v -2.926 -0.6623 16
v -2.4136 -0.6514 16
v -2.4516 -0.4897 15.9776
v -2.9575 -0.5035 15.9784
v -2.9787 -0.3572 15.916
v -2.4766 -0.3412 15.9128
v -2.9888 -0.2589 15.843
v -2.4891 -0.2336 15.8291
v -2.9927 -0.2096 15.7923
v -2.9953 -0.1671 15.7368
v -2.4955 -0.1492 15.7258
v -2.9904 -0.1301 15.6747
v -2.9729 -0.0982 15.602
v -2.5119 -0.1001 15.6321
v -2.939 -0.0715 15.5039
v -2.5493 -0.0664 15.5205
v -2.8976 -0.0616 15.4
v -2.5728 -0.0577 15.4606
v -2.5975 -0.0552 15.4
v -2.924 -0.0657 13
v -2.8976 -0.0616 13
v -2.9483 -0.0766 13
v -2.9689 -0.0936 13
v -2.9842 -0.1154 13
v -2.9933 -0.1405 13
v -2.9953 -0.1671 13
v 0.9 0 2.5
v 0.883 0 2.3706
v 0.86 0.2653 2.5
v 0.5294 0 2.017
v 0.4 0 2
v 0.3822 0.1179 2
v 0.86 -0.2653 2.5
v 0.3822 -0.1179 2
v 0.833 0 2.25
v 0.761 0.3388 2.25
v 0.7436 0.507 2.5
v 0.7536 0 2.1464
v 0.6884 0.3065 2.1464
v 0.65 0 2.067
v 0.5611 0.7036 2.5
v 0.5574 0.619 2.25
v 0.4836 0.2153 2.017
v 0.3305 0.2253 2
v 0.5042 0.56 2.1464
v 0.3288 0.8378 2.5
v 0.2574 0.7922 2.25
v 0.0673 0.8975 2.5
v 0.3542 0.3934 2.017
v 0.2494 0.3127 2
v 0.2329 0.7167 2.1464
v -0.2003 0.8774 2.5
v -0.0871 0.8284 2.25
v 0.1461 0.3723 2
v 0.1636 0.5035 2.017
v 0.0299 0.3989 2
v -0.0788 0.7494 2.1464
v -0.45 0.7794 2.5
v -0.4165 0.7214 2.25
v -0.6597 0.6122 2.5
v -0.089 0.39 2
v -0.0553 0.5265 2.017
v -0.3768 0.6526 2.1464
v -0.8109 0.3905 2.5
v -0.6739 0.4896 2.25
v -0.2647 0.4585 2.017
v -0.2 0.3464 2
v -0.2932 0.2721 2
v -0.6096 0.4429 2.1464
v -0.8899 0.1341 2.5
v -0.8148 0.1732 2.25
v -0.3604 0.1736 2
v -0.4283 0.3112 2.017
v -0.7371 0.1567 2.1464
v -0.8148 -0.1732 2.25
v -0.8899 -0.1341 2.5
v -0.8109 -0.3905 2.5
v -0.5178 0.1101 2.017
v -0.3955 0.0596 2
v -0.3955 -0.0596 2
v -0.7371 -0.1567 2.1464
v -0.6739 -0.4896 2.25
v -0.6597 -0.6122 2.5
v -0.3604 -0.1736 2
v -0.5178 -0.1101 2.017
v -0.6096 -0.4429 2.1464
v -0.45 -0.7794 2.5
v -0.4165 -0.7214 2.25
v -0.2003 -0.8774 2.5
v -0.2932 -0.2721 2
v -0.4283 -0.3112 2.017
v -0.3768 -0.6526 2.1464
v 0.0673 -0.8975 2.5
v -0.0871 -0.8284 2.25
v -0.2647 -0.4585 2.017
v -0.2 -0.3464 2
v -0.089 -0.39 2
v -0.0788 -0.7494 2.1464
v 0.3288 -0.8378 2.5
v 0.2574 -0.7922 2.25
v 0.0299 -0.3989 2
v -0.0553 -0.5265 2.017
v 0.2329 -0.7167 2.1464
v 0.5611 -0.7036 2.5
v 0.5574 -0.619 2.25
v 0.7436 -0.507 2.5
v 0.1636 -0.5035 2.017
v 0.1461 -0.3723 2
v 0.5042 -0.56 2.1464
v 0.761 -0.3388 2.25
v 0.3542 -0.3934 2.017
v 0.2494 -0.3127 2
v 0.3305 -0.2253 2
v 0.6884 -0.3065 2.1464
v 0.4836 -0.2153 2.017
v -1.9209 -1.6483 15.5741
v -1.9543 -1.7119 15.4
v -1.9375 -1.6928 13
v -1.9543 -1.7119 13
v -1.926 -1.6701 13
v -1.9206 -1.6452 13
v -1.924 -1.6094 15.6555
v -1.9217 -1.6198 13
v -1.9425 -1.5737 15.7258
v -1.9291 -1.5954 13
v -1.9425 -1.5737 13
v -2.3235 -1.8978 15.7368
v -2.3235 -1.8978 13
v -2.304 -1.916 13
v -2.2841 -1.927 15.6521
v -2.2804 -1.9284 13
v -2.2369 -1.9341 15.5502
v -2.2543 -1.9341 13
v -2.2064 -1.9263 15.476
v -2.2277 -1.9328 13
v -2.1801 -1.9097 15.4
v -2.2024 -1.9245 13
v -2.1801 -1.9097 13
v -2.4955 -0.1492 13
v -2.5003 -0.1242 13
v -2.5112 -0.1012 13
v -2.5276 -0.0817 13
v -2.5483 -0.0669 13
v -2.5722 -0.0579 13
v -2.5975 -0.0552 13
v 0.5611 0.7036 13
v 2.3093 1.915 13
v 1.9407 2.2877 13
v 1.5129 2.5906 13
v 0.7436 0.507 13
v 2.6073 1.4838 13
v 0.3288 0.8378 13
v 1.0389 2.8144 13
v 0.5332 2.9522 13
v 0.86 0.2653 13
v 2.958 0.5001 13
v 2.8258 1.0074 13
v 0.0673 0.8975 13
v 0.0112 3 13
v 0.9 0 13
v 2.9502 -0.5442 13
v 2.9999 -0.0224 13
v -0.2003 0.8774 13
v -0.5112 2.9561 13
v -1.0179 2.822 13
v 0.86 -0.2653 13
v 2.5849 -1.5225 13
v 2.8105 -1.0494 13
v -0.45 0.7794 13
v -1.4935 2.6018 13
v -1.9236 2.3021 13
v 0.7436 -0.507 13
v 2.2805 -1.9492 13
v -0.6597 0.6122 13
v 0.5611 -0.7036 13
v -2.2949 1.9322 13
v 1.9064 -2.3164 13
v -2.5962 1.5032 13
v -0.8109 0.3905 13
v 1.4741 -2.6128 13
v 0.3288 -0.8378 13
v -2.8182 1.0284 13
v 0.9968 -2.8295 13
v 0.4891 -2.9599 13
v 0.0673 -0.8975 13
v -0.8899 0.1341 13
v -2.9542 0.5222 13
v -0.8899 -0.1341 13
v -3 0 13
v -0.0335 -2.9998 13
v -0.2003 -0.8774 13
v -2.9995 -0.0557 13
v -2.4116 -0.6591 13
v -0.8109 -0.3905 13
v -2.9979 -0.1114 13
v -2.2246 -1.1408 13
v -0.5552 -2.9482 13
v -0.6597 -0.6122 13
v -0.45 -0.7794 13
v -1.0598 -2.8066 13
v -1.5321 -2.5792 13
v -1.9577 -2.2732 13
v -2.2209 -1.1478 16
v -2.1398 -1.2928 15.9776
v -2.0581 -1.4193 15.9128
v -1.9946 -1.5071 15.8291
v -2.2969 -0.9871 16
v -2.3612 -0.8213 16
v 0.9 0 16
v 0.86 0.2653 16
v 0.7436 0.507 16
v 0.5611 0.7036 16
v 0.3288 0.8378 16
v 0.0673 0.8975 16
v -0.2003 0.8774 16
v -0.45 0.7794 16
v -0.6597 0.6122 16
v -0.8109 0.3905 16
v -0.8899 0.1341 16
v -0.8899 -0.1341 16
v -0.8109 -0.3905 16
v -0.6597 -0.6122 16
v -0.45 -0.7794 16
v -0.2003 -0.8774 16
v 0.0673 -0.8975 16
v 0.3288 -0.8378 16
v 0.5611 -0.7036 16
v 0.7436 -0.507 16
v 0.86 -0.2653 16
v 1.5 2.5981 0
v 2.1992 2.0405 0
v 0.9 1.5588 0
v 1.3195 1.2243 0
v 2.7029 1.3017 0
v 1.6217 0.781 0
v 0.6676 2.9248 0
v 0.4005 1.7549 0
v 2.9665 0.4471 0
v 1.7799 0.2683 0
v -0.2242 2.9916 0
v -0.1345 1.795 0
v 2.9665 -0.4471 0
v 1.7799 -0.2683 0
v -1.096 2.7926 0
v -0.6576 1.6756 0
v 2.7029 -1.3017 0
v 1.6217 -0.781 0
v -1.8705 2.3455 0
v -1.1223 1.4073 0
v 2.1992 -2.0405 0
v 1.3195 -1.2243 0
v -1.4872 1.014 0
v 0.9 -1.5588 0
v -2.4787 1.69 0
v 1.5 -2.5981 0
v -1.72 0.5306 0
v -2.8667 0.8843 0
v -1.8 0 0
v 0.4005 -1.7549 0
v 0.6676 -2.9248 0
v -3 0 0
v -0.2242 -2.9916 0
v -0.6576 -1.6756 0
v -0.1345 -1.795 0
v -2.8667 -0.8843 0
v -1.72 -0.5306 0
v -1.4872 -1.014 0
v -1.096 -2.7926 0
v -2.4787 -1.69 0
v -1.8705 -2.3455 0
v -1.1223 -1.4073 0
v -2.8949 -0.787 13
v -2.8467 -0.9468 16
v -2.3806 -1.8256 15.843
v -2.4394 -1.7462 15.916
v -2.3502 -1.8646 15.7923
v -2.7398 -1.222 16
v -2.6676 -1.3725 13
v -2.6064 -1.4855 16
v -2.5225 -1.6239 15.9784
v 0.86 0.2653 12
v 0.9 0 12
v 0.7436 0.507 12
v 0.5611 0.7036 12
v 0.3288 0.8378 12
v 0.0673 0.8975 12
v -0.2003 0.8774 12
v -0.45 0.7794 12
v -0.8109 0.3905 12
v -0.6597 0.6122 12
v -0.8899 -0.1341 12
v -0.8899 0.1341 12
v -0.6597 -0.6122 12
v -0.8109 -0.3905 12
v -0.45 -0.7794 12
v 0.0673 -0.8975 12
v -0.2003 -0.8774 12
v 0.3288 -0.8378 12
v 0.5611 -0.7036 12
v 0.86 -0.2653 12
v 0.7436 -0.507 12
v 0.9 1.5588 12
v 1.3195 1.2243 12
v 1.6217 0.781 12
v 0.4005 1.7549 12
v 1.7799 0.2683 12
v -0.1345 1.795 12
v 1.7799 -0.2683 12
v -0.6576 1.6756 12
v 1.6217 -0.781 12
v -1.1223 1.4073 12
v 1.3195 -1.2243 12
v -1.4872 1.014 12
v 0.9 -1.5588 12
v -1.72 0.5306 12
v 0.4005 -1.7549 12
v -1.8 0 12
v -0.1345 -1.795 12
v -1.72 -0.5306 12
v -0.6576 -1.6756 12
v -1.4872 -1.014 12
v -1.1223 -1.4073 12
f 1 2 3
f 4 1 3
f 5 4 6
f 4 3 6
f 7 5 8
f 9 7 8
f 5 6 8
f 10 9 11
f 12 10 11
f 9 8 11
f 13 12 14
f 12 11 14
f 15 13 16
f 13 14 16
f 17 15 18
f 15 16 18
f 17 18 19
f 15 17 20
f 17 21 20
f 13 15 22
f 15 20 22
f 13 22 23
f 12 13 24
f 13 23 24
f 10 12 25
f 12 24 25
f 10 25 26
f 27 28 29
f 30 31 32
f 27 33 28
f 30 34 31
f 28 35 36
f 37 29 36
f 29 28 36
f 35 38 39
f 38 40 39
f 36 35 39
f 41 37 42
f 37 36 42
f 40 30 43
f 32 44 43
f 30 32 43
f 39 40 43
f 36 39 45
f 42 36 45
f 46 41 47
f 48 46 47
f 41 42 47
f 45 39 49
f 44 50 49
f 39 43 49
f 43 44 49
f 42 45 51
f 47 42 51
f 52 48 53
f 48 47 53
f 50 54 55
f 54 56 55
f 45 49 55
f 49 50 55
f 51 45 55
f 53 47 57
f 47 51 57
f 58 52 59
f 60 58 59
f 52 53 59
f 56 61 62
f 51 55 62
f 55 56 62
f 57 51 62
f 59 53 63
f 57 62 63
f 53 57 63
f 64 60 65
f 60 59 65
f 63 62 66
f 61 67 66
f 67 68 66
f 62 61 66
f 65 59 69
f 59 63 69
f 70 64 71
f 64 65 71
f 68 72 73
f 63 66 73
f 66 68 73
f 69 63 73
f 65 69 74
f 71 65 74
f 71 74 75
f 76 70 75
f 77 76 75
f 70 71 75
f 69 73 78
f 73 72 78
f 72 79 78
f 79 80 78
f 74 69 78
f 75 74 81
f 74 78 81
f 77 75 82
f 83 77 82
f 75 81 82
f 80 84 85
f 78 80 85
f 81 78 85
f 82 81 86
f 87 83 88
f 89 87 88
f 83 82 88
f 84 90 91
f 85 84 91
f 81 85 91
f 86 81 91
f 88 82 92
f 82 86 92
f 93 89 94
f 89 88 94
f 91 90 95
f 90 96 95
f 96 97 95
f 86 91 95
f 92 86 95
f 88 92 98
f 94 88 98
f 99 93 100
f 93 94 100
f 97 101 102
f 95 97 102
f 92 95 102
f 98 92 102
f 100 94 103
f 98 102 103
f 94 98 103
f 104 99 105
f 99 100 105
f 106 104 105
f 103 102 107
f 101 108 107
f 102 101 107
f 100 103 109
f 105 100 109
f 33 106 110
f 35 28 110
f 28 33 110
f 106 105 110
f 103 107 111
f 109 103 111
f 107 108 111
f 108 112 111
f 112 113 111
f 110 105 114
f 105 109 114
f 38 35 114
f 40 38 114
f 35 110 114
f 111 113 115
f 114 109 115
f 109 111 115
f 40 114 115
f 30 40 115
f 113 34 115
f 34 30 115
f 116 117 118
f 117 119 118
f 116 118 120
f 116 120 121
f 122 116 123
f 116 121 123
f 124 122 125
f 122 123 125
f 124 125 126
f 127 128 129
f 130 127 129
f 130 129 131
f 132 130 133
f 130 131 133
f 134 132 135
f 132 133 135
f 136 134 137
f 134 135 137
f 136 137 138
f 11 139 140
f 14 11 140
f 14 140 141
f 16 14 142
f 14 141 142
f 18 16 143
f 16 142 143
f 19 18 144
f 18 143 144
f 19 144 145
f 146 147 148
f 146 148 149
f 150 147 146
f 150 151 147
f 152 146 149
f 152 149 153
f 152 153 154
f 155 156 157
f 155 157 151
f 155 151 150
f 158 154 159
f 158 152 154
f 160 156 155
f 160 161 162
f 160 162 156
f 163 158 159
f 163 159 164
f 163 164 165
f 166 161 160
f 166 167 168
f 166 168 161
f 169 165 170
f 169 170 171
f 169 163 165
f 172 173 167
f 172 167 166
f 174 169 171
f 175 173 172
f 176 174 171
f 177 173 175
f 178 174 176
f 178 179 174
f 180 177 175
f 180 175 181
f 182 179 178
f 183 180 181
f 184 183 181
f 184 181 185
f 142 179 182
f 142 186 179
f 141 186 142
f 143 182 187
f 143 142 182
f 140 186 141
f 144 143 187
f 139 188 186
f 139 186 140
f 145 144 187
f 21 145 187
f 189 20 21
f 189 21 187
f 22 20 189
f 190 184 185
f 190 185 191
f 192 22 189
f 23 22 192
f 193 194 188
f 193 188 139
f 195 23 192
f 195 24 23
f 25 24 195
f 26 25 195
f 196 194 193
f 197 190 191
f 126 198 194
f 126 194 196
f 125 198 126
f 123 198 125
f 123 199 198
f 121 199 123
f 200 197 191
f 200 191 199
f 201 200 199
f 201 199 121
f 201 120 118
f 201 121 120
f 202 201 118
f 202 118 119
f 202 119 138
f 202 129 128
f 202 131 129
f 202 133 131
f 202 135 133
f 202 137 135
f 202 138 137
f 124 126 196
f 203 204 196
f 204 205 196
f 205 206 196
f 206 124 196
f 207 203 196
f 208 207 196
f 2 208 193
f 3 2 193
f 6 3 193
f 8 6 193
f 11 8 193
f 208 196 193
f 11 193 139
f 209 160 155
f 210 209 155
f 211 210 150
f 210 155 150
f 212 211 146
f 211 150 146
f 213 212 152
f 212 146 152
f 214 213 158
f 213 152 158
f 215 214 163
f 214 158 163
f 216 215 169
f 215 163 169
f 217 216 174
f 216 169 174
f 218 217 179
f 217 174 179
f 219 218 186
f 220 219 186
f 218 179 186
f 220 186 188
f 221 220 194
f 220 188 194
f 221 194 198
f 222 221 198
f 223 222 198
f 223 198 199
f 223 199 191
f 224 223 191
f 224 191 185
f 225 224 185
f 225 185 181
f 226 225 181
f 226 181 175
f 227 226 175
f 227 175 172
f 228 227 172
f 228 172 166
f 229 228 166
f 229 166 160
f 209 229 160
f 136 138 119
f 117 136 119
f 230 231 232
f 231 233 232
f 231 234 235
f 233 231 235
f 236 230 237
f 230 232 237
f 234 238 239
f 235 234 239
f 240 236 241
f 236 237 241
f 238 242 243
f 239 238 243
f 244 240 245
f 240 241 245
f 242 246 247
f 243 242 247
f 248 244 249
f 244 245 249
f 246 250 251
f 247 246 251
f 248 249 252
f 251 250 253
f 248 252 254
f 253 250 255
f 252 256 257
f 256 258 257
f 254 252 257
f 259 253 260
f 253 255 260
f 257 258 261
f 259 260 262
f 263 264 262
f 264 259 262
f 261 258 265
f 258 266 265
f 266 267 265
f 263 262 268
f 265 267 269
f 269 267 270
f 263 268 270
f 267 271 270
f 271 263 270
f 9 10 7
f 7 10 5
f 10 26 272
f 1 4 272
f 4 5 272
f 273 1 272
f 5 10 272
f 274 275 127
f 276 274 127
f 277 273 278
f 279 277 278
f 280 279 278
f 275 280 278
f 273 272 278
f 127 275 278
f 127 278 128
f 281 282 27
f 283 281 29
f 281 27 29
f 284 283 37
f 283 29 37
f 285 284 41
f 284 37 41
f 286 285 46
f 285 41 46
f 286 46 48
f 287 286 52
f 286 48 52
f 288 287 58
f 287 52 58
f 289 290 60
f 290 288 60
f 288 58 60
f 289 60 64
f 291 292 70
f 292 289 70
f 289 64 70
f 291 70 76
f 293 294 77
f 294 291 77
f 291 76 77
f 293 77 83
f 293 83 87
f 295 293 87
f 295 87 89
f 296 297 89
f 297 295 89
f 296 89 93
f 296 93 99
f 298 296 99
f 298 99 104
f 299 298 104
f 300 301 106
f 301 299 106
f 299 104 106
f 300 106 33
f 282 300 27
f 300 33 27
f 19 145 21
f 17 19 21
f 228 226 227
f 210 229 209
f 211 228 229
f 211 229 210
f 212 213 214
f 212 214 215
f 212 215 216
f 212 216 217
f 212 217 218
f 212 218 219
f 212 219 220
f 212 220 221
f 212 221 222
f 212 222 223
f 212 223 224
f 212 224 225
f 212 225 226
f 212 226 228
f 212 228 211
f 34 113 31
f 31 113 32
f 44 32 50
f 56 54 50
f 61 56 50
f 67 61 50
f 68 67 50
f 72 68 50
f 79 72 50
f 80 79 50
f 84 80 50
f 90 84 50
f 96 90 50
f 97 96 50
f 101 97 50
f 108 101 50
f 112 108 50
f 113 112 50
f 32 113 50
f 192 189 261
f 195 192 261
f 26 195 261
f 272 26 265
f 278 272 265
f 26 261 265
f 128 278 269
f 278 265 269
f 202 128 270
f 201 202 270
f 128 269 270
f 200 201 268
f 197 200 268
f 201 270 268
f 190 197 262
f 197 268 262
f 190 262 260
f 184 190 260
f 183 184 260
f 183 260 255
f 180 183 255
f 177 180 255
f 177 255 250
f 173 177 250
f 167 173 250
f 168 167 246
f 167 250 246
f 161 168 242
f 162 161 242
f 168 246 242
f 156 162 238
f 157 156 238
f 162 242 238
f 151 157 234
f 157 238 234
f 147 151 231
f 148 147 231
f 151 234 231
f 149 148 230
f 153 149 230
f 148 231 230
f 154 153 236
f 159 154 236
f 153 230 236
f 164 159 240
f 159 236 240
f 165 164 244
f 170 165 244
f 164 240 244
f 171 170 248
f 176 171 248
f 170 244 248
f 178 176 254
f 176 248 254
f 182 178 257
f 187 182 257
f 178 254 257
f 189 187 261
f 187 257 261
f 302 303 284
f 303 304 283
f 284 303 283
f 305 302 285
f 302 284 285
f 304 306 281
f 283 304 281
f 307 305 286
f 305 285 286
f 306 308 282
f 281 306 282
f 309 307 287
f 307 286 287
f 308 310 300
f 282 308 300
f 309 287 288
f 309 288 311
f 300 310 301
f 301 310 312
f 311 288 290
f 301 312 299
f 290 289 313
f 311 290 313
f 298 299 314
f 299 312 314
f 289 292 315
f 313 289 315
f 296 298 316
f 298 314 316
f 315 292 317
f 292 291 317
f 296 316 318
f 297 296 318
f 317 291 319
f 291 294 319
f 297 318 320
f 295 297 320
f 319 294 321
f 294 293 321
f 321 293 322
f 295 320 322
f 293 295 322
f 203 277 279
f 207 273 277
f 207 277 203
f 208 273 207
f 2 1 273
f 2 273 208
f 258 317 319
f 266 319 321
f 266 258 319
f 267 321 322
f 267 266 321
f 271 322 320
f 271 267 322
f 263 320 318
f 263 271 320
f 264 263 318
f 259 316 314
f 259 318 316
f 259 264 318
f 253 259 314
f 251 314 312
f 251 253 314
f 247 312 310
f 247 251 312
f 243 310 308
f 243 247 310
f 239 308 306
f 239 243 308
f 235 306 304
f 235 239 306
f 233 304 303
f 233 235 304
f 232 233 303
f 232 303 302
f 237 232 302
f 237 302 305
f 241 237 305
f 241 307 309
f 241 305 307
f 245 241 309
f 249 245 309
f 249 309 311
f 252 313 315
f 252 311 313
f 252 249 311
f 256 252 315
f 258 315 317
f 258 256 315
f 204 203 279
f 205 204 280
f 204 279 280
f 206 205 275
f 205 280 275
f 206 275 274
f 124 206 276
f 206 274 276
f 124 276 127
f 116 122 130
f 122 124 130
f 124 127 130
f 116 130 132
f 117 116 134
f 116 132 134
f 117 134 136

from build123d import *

# Parameters (mm, degrees)
SKETCH_1_R           = 3
SKETCH_1_R_2         = 1.8
EXTRUDE_1_DEPTH      = 13
EXTRUDE_2_DEPTH      = 3
EXTRUDE_2_DEPTH_BACK = 11
SKETCH_2_R           = 0.9
FILLET_1_R           = 0.5
EXTRUDE_START        = -1
SKETCH_3_R           = 3
EXTRUDE_3_DEPTH      = 1
EXTRUDE_4_DEPTH      = 3
FILLET_2_R           = 0.6


with BuildPart() as part:
    # 草图1 → 凸台-拉伸1 (new body)
    with BuildSketch(Plane.XY):
        with Locations(Location((0, 0, 0), (0, 0, 180))):
            Circle(SKETCH_1_R)
        with Locations(Location((0, 0, 0), (0, 0, 180))):
            Circle(SKETCH_1_R_2, mode=Mode.SUBTRACT)
    extrude(amount=EXTRUDE_1_DEPTH)



with BuildPart() as body_2:
    # 草图2 → 凸台-拉伸2 (new, two sides: drawn at the far end of the back side and taken through both)
    with BuildSketch(Plane.XY.offset(13).offset(-EXTRUDE_2_DEPTH_BACK)):
        Circle(SKETCH_2_R)
    extrude(amount=EXTRUDE_2_DEPTH + EXTRUDE_2_DEPTH_BACK)

    # 圆角1
    fillet_1_edges = [body_2.edges().sort_by_distance(p)[0] for p in [
        (-0.9, 0, 2),
    ]]
    fillet(fillet_1_edges, radius=FILLET_1_R)


with BuildPart() as part_1:
    add(part.part)

    add(body_2.part)  # 凸台-拉伸3 merges body 2
    # 草图3 → 凸台-拉伸3 (add)
    with BuildSketch(Plane.XY.offset(13).offset(EXTRUDE_START)):
        with Locations(Location((0, 0, 0), (0, 0, 180))):
            Circle(SKETCH_3_R)
    extrude(amount=EXTRUDE_3_DEPTH)

    # 草图4 → 凸台-拉伸4 (add)
    with BuildSketch(Plane.XY.offset(13)):
        with BuildLine():
            Line((-2.597489972, -0.055189178), (-2.897621372, -0.061566106))
            ThreePointArc((-2.897621372, -0.061566106), (-2.968876341, -0.093606123), (-2.995341868, -0.167114008))
            ThreePointArc((-2.995341868, -0.167114008), (-2.796645847, -1.085712673), (-2.323473449, -1.897754234))
            ThreePointArc((-2.323473449, -1.897754234), (-2.254341449, -1.934149288), (-2.18013282, -1.909717488))
            Line((-2.18013282, -1.909717488), (-1.954317839, -1.711911733))
            ThreePointArc((-1.954317839, -1.711911733), (-1.920572579, -1.645205485), (-1.942508993, -1.573740389))
            ThreePointArc((-1.942508993, -1.573740389), (-2.330538206, -0.904760561), (-2.49554398, -0.149198667))
            ThreePointArc((-2.49554398, -0.149198667), (-2.527574533, -0.081652314), (-2.597489972, -0.055189178))
        make_face()
    extrude(amount=EXTRUDE_4_DEPTH)

    # 圆角2
    # the kernel refuses this fillet: 0.6 mm, written as the material it takes off along each edge
    with BuildSketch(Plane(origin=(-1.097828437, -0.023325691, 16), x_dir=(0, 0, -1), z_dir=(-0.9997743563663354, -0.021242324549825015, 0)), Plane(origin=(-3.308458751, -2.898090189, 16), x_dir=(0, 0, -1), z_dir=(0.7522172870457152, 0.6589151334349395, 0))) as fillet_2_piece_1:
        with BuildLine():
            CenterArc((FILLET_2_R, FILLET_2_R), FILLET_2_R, 180, 90)
            Line((0, FILLET_2_R), (0, 0))
            Line((0, 0), (FILLET_2_R, 0))
        make_face()
    extrude(amount=3.300199138, mode=Mode.SUBTRACT)


solid = part_1.part
